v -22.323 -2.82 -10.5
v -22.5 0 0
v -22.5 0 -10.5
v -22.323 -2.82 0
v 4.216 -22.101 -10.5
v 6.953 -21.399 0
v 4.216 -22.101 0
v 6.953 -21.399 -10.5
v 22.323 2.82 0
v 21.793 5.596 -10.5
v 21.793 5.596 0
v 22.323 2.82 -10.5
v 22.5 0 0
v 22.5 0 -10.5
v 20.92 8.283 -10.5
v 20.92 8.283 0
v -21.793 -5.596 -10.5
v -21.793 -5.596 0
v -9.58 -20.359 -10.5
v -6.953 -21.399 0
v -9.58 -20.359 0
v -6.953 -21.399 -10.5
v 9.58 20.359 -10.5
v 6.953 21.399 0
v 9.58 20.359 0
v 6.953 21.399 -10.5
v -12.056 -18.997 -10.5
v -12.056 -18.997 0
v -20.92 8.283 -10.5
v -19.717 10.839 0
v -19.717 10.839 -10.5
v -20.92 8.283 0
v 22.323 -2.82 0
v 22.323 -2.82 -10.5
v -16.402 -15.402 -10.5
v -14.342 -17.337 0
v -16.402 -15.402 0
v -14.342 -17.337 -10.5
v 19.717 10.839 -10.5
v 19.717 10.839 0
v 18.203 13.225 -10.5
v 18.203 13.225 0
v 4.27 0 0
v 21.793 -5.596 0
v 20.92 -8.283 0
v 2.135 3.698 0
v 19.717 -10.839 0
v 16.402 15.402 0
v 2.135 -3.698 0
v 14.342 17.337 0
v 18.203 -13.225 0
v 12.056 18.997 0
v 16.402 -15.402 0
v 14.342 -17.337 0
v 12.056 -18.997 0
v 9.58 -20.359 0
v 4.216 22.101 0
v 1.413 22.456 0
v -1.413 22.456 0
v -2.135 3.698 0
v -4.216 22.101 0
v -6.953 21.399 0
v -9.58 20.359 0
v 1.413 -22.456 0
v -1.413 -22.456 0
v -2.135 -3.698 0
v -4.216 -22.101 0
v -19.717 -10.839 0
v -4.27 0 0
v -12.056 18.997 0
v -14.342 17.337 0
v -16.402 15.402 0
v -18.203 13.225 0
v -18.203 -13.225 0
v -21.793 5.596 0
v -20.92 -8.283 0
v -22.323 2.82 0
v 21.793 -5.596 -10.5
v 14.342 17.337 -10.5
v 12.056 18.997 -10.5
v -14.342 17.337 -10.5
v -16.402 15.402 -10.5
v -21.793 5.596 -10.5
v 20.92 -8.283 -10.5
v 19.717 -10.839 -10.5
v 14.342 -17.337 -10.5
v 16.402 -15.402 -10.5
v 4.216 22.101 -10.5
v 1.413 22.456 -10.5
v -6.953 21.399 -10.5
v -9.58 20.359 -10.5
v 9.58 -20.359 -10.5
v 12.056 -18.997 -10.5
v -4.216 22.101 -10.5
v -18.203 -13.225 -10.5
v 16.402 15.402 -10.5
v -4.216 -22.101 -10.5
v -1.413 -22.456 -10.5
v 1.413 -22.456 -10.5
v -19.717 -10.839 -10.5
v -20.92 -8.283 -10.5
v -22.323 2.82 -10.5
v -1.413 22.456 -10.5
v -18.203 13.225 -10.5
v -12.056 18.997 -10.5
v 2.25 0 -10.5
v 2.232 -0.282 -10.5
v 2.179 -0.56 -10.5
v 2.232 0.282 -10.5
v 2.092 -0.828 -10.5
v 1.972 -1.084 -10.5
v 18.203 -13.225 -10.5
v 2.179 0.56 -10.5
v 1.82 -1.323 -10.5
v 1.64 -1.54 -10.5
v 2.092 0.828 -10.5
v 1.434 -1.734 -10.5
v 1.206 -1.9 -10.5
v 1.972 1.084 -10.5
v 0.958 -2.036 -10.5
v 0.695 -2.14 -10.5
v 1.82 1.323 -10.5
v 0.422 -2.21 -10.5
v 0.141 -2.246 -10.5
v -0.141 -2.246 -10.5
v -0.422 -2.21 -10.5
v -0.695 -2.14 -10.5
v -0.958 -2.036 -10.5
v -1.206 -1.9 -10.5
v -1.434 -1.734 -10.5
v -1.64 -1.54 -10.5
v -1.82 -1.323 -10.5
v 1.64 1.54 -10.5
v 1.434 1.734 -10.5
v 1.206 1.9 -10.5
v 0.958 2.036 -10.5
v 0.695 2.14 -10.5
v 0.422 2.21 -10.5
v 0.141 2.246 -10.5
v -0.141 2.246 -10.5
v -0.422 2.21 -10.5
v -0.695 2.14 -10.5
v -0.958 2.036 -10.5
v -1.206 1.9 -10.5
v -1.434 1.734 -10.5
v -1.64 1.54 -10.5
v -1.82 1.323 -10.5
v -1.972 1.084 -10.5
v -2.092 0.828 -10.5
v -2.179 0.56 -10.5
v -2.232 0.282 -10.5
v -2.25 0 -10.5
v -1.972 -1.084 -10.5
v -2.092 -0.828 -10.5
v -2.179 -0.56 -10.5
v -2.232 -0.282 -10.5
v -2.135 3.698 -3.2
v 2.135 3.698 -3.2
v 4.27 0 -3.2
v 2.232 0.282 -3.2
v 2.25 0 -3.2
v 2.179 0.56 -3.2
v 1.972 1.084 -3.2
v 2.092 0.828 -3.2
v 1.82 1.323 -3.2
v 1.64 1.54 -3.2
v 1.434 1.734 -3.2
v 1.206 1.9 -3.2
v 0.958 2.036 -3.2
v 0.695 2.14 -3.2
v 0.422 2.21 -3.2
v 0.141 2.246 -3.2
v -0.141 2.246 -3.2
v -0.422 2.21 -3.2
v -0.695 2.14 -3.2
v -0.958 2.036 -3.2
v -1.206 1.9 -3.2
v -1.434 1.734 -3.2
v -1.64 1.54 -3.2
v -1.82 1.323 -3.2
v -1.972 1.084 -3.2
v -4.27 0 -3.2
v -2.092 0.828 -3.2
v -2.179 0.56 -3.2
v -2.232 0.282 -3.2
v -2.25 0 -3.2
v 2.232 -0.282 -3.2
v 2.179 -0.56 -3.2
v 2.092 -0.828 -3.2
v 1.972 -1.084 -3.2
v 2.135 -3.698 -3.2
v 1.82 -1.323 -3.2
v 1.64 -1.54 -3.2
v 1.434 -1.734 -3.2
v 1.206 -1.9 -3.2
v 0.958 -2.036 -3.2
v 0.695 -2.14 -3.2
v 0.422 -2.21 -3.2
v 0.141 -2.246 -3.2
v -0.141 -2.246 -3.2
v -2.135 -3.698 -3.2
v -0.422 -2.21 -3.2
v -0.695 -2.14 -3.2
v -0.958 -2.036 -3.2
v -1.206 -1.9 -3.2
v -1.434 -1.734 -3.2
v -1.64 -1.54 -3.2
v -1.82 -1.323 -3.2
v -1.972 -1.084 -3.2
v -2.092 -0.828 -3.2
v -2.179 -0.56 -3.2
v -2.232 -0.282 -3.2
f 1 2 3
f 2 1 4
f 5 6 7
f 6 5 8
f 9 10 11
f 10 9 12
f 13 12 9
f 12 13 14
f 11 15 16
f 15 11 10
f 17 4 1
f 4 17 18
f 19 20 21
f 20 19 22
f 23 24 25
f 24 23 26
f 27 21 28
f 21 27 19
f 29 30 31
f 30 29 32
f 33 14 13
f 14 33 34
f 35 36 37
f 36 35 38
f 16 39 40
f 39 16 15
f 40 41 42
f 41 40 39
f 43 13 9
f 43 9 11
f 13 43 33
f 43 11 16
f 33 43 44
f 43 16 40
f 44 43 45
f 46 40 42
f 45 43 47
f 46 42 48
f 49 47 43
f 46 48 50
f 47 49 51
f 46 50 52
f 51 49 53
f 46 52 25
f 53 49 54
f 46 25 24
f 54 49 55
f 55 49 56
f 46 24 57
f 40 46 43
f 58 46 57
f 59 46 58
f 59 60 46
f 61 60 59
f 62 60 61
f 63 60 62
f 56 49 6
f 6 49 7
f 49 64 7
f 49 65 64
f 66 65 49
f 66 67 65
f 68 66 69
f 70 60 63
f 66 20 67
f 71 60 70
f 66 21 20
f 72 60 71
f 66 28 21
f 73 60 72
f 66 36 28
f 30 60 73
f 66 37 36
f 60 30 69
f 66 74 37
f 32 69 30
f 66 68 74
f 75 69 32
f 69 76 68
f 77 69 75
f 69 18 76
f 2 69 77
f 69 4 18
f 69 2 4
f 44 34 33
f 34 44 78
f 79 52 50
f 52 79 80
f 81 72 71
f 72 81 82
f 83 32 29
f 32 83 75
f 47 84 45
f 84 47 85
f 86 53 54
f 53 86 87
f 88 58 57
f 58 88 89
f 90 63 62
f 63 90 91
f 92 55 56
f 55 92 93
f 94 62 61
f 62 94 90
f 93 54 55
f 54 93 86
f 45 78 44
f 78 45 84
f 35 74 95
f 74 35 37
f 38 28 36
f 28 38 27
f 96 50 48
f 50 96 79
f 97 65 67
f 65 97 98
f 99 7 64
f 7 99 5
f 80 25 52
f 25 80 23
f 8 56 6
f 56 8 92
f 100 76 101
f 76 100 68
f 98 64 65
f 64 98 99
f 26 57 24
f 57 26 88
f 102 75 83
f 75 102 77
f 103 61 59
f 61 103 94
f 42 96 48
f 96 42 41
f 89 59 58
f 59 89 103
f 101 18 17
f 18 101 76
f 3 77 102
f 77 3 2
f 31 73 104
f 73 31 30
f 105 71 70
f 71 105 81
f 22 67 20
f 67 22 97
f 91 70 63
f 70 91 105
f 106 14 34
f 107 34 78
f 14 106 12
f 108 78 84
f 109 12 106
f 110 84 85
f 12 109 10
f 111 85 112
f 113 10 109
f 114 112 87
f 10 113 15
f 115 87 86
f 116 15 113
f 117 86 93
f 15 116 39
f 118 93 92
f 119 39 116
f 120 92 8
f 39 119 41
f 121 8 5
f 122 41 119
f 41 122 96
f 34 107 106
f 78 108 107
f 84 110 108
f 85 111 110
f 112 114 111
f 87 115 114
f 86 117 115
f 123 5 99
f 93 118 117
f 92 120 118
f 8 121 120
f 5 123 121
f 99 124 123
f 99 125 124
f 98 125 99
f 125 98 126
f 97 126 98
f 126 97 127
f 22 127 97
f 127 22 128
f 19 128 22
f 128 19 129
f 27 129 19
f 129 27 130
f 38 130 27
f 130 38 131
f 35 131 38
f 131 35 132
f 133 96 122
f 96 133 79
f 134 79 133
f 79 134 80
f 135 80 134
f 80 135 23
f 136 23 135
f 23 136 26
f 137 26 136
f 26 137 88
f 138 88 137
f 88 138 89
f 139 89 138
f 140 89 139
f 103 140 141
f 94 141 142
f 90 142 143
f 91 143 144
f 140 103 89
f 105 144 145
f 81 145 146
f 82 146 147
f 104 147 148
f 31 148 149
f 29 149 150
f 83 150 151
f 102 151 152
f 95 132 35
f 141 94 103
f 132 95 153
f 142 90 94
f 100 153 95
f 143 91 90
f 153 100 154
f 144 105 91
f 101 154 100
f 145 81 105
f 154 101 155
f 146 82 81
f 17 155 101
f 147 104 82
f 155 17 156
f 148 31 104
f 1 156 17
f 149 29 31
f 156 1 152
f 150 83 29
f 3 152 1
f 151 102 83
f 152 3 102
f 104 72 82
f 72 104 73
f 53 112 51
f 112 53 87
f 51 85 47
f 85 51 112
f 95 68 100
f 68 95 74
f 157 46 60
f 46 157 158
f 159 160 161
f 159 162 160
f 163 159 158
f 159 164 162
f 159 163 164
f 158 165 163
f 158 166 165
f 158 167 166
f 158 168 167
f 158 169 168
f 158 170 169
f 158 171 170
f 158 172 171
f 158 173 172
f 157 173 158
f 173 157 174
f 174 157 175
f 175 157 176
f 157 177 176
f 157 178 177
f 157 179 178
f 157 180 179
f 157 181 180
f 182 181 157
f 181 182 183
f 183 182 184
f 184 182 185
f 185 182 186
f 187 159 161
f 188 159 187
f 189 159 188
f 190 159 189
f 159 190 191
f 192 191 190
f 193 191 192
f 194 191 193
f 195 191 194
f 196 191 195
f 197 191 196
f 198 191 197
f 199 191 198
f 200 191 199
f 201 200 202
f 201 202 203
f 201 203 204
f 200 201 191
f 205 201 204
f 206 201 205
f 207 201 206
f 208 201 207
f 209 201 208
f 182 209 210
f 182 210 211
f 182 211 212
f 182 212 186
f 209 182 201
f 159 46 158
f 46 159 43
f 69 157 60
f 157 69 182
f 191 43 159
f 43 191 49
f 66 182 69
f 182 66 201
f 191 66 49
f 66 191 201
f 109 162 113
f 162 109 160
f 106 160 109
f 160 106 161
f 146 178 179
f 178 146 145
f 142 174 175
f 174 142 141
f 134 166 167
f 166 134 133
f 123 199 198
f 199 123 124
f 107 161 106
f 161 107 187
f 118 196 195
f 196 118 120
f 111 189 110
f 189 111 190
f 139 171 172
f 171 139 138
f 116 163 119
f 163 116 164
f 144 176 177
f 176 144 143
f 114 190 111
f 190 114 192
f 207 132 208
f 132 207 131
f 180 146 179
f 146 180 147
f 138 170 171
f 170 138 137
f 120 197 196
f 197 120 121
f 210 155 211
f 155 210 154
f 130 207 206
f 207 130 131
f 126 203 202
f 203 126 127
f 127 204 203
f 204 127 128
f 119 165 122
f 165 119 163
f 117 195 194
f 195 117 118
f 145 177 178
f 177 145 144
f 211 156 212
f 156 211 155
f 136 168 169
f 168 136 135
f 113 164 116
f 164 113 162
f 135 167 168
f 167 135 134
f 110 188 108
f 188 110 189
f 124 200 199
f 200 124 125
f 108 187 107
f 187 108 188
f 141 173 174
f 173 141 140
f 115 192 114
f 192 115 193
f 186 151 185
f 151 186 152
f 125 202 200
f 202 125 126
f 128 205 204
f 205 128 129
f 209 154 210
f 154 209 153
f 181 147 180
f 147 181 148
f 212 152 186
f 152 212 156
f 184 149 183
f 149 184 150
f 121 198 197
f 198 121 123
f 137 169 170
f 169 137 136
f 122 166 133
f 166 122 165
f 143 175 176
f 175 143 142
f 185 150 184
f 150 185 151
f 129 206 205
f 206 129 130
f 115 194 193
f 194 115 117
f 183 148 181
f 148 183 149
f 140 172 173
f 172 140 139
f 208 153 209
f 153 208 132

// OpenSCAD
$fn = 50;


difference() {
	union() {
		translate(v = [0, 0, -10.5000000000]) {
			cylinder(h = 10.5000000000, r = 22.5000000000);
		}
		translate(v = [0, 0, -9.0000000000]) {
			cylinder(h = 9, r = 2.8750000000);
		}
	}
	union() {
		translate(v = [0, 0, 0]) {
			rotate(a = [0, 0, 0]) {
				difference() {
					union() {
						translate(v = [0, 0, -3.2000000000]) {
							linear_extrude(height = 3.2000000000) {
								polygon(points = [[4.2698000000, 0.0000000000], [2.1349000000, 3.6977552691], [-2.1349000000, 3.6977552691], [-4.2698000000, 0.0000000000], [-2.1349000000, -3.6977552691], [2.1349000000, -3.6977552691]]);
							}
						}
					}
					union();
				}
			}
		}
		#translate(v = [0, 0, -100.0000000000]) {
			cylinder(h = 200, r = 2.2500000000);
		}
	}
}
